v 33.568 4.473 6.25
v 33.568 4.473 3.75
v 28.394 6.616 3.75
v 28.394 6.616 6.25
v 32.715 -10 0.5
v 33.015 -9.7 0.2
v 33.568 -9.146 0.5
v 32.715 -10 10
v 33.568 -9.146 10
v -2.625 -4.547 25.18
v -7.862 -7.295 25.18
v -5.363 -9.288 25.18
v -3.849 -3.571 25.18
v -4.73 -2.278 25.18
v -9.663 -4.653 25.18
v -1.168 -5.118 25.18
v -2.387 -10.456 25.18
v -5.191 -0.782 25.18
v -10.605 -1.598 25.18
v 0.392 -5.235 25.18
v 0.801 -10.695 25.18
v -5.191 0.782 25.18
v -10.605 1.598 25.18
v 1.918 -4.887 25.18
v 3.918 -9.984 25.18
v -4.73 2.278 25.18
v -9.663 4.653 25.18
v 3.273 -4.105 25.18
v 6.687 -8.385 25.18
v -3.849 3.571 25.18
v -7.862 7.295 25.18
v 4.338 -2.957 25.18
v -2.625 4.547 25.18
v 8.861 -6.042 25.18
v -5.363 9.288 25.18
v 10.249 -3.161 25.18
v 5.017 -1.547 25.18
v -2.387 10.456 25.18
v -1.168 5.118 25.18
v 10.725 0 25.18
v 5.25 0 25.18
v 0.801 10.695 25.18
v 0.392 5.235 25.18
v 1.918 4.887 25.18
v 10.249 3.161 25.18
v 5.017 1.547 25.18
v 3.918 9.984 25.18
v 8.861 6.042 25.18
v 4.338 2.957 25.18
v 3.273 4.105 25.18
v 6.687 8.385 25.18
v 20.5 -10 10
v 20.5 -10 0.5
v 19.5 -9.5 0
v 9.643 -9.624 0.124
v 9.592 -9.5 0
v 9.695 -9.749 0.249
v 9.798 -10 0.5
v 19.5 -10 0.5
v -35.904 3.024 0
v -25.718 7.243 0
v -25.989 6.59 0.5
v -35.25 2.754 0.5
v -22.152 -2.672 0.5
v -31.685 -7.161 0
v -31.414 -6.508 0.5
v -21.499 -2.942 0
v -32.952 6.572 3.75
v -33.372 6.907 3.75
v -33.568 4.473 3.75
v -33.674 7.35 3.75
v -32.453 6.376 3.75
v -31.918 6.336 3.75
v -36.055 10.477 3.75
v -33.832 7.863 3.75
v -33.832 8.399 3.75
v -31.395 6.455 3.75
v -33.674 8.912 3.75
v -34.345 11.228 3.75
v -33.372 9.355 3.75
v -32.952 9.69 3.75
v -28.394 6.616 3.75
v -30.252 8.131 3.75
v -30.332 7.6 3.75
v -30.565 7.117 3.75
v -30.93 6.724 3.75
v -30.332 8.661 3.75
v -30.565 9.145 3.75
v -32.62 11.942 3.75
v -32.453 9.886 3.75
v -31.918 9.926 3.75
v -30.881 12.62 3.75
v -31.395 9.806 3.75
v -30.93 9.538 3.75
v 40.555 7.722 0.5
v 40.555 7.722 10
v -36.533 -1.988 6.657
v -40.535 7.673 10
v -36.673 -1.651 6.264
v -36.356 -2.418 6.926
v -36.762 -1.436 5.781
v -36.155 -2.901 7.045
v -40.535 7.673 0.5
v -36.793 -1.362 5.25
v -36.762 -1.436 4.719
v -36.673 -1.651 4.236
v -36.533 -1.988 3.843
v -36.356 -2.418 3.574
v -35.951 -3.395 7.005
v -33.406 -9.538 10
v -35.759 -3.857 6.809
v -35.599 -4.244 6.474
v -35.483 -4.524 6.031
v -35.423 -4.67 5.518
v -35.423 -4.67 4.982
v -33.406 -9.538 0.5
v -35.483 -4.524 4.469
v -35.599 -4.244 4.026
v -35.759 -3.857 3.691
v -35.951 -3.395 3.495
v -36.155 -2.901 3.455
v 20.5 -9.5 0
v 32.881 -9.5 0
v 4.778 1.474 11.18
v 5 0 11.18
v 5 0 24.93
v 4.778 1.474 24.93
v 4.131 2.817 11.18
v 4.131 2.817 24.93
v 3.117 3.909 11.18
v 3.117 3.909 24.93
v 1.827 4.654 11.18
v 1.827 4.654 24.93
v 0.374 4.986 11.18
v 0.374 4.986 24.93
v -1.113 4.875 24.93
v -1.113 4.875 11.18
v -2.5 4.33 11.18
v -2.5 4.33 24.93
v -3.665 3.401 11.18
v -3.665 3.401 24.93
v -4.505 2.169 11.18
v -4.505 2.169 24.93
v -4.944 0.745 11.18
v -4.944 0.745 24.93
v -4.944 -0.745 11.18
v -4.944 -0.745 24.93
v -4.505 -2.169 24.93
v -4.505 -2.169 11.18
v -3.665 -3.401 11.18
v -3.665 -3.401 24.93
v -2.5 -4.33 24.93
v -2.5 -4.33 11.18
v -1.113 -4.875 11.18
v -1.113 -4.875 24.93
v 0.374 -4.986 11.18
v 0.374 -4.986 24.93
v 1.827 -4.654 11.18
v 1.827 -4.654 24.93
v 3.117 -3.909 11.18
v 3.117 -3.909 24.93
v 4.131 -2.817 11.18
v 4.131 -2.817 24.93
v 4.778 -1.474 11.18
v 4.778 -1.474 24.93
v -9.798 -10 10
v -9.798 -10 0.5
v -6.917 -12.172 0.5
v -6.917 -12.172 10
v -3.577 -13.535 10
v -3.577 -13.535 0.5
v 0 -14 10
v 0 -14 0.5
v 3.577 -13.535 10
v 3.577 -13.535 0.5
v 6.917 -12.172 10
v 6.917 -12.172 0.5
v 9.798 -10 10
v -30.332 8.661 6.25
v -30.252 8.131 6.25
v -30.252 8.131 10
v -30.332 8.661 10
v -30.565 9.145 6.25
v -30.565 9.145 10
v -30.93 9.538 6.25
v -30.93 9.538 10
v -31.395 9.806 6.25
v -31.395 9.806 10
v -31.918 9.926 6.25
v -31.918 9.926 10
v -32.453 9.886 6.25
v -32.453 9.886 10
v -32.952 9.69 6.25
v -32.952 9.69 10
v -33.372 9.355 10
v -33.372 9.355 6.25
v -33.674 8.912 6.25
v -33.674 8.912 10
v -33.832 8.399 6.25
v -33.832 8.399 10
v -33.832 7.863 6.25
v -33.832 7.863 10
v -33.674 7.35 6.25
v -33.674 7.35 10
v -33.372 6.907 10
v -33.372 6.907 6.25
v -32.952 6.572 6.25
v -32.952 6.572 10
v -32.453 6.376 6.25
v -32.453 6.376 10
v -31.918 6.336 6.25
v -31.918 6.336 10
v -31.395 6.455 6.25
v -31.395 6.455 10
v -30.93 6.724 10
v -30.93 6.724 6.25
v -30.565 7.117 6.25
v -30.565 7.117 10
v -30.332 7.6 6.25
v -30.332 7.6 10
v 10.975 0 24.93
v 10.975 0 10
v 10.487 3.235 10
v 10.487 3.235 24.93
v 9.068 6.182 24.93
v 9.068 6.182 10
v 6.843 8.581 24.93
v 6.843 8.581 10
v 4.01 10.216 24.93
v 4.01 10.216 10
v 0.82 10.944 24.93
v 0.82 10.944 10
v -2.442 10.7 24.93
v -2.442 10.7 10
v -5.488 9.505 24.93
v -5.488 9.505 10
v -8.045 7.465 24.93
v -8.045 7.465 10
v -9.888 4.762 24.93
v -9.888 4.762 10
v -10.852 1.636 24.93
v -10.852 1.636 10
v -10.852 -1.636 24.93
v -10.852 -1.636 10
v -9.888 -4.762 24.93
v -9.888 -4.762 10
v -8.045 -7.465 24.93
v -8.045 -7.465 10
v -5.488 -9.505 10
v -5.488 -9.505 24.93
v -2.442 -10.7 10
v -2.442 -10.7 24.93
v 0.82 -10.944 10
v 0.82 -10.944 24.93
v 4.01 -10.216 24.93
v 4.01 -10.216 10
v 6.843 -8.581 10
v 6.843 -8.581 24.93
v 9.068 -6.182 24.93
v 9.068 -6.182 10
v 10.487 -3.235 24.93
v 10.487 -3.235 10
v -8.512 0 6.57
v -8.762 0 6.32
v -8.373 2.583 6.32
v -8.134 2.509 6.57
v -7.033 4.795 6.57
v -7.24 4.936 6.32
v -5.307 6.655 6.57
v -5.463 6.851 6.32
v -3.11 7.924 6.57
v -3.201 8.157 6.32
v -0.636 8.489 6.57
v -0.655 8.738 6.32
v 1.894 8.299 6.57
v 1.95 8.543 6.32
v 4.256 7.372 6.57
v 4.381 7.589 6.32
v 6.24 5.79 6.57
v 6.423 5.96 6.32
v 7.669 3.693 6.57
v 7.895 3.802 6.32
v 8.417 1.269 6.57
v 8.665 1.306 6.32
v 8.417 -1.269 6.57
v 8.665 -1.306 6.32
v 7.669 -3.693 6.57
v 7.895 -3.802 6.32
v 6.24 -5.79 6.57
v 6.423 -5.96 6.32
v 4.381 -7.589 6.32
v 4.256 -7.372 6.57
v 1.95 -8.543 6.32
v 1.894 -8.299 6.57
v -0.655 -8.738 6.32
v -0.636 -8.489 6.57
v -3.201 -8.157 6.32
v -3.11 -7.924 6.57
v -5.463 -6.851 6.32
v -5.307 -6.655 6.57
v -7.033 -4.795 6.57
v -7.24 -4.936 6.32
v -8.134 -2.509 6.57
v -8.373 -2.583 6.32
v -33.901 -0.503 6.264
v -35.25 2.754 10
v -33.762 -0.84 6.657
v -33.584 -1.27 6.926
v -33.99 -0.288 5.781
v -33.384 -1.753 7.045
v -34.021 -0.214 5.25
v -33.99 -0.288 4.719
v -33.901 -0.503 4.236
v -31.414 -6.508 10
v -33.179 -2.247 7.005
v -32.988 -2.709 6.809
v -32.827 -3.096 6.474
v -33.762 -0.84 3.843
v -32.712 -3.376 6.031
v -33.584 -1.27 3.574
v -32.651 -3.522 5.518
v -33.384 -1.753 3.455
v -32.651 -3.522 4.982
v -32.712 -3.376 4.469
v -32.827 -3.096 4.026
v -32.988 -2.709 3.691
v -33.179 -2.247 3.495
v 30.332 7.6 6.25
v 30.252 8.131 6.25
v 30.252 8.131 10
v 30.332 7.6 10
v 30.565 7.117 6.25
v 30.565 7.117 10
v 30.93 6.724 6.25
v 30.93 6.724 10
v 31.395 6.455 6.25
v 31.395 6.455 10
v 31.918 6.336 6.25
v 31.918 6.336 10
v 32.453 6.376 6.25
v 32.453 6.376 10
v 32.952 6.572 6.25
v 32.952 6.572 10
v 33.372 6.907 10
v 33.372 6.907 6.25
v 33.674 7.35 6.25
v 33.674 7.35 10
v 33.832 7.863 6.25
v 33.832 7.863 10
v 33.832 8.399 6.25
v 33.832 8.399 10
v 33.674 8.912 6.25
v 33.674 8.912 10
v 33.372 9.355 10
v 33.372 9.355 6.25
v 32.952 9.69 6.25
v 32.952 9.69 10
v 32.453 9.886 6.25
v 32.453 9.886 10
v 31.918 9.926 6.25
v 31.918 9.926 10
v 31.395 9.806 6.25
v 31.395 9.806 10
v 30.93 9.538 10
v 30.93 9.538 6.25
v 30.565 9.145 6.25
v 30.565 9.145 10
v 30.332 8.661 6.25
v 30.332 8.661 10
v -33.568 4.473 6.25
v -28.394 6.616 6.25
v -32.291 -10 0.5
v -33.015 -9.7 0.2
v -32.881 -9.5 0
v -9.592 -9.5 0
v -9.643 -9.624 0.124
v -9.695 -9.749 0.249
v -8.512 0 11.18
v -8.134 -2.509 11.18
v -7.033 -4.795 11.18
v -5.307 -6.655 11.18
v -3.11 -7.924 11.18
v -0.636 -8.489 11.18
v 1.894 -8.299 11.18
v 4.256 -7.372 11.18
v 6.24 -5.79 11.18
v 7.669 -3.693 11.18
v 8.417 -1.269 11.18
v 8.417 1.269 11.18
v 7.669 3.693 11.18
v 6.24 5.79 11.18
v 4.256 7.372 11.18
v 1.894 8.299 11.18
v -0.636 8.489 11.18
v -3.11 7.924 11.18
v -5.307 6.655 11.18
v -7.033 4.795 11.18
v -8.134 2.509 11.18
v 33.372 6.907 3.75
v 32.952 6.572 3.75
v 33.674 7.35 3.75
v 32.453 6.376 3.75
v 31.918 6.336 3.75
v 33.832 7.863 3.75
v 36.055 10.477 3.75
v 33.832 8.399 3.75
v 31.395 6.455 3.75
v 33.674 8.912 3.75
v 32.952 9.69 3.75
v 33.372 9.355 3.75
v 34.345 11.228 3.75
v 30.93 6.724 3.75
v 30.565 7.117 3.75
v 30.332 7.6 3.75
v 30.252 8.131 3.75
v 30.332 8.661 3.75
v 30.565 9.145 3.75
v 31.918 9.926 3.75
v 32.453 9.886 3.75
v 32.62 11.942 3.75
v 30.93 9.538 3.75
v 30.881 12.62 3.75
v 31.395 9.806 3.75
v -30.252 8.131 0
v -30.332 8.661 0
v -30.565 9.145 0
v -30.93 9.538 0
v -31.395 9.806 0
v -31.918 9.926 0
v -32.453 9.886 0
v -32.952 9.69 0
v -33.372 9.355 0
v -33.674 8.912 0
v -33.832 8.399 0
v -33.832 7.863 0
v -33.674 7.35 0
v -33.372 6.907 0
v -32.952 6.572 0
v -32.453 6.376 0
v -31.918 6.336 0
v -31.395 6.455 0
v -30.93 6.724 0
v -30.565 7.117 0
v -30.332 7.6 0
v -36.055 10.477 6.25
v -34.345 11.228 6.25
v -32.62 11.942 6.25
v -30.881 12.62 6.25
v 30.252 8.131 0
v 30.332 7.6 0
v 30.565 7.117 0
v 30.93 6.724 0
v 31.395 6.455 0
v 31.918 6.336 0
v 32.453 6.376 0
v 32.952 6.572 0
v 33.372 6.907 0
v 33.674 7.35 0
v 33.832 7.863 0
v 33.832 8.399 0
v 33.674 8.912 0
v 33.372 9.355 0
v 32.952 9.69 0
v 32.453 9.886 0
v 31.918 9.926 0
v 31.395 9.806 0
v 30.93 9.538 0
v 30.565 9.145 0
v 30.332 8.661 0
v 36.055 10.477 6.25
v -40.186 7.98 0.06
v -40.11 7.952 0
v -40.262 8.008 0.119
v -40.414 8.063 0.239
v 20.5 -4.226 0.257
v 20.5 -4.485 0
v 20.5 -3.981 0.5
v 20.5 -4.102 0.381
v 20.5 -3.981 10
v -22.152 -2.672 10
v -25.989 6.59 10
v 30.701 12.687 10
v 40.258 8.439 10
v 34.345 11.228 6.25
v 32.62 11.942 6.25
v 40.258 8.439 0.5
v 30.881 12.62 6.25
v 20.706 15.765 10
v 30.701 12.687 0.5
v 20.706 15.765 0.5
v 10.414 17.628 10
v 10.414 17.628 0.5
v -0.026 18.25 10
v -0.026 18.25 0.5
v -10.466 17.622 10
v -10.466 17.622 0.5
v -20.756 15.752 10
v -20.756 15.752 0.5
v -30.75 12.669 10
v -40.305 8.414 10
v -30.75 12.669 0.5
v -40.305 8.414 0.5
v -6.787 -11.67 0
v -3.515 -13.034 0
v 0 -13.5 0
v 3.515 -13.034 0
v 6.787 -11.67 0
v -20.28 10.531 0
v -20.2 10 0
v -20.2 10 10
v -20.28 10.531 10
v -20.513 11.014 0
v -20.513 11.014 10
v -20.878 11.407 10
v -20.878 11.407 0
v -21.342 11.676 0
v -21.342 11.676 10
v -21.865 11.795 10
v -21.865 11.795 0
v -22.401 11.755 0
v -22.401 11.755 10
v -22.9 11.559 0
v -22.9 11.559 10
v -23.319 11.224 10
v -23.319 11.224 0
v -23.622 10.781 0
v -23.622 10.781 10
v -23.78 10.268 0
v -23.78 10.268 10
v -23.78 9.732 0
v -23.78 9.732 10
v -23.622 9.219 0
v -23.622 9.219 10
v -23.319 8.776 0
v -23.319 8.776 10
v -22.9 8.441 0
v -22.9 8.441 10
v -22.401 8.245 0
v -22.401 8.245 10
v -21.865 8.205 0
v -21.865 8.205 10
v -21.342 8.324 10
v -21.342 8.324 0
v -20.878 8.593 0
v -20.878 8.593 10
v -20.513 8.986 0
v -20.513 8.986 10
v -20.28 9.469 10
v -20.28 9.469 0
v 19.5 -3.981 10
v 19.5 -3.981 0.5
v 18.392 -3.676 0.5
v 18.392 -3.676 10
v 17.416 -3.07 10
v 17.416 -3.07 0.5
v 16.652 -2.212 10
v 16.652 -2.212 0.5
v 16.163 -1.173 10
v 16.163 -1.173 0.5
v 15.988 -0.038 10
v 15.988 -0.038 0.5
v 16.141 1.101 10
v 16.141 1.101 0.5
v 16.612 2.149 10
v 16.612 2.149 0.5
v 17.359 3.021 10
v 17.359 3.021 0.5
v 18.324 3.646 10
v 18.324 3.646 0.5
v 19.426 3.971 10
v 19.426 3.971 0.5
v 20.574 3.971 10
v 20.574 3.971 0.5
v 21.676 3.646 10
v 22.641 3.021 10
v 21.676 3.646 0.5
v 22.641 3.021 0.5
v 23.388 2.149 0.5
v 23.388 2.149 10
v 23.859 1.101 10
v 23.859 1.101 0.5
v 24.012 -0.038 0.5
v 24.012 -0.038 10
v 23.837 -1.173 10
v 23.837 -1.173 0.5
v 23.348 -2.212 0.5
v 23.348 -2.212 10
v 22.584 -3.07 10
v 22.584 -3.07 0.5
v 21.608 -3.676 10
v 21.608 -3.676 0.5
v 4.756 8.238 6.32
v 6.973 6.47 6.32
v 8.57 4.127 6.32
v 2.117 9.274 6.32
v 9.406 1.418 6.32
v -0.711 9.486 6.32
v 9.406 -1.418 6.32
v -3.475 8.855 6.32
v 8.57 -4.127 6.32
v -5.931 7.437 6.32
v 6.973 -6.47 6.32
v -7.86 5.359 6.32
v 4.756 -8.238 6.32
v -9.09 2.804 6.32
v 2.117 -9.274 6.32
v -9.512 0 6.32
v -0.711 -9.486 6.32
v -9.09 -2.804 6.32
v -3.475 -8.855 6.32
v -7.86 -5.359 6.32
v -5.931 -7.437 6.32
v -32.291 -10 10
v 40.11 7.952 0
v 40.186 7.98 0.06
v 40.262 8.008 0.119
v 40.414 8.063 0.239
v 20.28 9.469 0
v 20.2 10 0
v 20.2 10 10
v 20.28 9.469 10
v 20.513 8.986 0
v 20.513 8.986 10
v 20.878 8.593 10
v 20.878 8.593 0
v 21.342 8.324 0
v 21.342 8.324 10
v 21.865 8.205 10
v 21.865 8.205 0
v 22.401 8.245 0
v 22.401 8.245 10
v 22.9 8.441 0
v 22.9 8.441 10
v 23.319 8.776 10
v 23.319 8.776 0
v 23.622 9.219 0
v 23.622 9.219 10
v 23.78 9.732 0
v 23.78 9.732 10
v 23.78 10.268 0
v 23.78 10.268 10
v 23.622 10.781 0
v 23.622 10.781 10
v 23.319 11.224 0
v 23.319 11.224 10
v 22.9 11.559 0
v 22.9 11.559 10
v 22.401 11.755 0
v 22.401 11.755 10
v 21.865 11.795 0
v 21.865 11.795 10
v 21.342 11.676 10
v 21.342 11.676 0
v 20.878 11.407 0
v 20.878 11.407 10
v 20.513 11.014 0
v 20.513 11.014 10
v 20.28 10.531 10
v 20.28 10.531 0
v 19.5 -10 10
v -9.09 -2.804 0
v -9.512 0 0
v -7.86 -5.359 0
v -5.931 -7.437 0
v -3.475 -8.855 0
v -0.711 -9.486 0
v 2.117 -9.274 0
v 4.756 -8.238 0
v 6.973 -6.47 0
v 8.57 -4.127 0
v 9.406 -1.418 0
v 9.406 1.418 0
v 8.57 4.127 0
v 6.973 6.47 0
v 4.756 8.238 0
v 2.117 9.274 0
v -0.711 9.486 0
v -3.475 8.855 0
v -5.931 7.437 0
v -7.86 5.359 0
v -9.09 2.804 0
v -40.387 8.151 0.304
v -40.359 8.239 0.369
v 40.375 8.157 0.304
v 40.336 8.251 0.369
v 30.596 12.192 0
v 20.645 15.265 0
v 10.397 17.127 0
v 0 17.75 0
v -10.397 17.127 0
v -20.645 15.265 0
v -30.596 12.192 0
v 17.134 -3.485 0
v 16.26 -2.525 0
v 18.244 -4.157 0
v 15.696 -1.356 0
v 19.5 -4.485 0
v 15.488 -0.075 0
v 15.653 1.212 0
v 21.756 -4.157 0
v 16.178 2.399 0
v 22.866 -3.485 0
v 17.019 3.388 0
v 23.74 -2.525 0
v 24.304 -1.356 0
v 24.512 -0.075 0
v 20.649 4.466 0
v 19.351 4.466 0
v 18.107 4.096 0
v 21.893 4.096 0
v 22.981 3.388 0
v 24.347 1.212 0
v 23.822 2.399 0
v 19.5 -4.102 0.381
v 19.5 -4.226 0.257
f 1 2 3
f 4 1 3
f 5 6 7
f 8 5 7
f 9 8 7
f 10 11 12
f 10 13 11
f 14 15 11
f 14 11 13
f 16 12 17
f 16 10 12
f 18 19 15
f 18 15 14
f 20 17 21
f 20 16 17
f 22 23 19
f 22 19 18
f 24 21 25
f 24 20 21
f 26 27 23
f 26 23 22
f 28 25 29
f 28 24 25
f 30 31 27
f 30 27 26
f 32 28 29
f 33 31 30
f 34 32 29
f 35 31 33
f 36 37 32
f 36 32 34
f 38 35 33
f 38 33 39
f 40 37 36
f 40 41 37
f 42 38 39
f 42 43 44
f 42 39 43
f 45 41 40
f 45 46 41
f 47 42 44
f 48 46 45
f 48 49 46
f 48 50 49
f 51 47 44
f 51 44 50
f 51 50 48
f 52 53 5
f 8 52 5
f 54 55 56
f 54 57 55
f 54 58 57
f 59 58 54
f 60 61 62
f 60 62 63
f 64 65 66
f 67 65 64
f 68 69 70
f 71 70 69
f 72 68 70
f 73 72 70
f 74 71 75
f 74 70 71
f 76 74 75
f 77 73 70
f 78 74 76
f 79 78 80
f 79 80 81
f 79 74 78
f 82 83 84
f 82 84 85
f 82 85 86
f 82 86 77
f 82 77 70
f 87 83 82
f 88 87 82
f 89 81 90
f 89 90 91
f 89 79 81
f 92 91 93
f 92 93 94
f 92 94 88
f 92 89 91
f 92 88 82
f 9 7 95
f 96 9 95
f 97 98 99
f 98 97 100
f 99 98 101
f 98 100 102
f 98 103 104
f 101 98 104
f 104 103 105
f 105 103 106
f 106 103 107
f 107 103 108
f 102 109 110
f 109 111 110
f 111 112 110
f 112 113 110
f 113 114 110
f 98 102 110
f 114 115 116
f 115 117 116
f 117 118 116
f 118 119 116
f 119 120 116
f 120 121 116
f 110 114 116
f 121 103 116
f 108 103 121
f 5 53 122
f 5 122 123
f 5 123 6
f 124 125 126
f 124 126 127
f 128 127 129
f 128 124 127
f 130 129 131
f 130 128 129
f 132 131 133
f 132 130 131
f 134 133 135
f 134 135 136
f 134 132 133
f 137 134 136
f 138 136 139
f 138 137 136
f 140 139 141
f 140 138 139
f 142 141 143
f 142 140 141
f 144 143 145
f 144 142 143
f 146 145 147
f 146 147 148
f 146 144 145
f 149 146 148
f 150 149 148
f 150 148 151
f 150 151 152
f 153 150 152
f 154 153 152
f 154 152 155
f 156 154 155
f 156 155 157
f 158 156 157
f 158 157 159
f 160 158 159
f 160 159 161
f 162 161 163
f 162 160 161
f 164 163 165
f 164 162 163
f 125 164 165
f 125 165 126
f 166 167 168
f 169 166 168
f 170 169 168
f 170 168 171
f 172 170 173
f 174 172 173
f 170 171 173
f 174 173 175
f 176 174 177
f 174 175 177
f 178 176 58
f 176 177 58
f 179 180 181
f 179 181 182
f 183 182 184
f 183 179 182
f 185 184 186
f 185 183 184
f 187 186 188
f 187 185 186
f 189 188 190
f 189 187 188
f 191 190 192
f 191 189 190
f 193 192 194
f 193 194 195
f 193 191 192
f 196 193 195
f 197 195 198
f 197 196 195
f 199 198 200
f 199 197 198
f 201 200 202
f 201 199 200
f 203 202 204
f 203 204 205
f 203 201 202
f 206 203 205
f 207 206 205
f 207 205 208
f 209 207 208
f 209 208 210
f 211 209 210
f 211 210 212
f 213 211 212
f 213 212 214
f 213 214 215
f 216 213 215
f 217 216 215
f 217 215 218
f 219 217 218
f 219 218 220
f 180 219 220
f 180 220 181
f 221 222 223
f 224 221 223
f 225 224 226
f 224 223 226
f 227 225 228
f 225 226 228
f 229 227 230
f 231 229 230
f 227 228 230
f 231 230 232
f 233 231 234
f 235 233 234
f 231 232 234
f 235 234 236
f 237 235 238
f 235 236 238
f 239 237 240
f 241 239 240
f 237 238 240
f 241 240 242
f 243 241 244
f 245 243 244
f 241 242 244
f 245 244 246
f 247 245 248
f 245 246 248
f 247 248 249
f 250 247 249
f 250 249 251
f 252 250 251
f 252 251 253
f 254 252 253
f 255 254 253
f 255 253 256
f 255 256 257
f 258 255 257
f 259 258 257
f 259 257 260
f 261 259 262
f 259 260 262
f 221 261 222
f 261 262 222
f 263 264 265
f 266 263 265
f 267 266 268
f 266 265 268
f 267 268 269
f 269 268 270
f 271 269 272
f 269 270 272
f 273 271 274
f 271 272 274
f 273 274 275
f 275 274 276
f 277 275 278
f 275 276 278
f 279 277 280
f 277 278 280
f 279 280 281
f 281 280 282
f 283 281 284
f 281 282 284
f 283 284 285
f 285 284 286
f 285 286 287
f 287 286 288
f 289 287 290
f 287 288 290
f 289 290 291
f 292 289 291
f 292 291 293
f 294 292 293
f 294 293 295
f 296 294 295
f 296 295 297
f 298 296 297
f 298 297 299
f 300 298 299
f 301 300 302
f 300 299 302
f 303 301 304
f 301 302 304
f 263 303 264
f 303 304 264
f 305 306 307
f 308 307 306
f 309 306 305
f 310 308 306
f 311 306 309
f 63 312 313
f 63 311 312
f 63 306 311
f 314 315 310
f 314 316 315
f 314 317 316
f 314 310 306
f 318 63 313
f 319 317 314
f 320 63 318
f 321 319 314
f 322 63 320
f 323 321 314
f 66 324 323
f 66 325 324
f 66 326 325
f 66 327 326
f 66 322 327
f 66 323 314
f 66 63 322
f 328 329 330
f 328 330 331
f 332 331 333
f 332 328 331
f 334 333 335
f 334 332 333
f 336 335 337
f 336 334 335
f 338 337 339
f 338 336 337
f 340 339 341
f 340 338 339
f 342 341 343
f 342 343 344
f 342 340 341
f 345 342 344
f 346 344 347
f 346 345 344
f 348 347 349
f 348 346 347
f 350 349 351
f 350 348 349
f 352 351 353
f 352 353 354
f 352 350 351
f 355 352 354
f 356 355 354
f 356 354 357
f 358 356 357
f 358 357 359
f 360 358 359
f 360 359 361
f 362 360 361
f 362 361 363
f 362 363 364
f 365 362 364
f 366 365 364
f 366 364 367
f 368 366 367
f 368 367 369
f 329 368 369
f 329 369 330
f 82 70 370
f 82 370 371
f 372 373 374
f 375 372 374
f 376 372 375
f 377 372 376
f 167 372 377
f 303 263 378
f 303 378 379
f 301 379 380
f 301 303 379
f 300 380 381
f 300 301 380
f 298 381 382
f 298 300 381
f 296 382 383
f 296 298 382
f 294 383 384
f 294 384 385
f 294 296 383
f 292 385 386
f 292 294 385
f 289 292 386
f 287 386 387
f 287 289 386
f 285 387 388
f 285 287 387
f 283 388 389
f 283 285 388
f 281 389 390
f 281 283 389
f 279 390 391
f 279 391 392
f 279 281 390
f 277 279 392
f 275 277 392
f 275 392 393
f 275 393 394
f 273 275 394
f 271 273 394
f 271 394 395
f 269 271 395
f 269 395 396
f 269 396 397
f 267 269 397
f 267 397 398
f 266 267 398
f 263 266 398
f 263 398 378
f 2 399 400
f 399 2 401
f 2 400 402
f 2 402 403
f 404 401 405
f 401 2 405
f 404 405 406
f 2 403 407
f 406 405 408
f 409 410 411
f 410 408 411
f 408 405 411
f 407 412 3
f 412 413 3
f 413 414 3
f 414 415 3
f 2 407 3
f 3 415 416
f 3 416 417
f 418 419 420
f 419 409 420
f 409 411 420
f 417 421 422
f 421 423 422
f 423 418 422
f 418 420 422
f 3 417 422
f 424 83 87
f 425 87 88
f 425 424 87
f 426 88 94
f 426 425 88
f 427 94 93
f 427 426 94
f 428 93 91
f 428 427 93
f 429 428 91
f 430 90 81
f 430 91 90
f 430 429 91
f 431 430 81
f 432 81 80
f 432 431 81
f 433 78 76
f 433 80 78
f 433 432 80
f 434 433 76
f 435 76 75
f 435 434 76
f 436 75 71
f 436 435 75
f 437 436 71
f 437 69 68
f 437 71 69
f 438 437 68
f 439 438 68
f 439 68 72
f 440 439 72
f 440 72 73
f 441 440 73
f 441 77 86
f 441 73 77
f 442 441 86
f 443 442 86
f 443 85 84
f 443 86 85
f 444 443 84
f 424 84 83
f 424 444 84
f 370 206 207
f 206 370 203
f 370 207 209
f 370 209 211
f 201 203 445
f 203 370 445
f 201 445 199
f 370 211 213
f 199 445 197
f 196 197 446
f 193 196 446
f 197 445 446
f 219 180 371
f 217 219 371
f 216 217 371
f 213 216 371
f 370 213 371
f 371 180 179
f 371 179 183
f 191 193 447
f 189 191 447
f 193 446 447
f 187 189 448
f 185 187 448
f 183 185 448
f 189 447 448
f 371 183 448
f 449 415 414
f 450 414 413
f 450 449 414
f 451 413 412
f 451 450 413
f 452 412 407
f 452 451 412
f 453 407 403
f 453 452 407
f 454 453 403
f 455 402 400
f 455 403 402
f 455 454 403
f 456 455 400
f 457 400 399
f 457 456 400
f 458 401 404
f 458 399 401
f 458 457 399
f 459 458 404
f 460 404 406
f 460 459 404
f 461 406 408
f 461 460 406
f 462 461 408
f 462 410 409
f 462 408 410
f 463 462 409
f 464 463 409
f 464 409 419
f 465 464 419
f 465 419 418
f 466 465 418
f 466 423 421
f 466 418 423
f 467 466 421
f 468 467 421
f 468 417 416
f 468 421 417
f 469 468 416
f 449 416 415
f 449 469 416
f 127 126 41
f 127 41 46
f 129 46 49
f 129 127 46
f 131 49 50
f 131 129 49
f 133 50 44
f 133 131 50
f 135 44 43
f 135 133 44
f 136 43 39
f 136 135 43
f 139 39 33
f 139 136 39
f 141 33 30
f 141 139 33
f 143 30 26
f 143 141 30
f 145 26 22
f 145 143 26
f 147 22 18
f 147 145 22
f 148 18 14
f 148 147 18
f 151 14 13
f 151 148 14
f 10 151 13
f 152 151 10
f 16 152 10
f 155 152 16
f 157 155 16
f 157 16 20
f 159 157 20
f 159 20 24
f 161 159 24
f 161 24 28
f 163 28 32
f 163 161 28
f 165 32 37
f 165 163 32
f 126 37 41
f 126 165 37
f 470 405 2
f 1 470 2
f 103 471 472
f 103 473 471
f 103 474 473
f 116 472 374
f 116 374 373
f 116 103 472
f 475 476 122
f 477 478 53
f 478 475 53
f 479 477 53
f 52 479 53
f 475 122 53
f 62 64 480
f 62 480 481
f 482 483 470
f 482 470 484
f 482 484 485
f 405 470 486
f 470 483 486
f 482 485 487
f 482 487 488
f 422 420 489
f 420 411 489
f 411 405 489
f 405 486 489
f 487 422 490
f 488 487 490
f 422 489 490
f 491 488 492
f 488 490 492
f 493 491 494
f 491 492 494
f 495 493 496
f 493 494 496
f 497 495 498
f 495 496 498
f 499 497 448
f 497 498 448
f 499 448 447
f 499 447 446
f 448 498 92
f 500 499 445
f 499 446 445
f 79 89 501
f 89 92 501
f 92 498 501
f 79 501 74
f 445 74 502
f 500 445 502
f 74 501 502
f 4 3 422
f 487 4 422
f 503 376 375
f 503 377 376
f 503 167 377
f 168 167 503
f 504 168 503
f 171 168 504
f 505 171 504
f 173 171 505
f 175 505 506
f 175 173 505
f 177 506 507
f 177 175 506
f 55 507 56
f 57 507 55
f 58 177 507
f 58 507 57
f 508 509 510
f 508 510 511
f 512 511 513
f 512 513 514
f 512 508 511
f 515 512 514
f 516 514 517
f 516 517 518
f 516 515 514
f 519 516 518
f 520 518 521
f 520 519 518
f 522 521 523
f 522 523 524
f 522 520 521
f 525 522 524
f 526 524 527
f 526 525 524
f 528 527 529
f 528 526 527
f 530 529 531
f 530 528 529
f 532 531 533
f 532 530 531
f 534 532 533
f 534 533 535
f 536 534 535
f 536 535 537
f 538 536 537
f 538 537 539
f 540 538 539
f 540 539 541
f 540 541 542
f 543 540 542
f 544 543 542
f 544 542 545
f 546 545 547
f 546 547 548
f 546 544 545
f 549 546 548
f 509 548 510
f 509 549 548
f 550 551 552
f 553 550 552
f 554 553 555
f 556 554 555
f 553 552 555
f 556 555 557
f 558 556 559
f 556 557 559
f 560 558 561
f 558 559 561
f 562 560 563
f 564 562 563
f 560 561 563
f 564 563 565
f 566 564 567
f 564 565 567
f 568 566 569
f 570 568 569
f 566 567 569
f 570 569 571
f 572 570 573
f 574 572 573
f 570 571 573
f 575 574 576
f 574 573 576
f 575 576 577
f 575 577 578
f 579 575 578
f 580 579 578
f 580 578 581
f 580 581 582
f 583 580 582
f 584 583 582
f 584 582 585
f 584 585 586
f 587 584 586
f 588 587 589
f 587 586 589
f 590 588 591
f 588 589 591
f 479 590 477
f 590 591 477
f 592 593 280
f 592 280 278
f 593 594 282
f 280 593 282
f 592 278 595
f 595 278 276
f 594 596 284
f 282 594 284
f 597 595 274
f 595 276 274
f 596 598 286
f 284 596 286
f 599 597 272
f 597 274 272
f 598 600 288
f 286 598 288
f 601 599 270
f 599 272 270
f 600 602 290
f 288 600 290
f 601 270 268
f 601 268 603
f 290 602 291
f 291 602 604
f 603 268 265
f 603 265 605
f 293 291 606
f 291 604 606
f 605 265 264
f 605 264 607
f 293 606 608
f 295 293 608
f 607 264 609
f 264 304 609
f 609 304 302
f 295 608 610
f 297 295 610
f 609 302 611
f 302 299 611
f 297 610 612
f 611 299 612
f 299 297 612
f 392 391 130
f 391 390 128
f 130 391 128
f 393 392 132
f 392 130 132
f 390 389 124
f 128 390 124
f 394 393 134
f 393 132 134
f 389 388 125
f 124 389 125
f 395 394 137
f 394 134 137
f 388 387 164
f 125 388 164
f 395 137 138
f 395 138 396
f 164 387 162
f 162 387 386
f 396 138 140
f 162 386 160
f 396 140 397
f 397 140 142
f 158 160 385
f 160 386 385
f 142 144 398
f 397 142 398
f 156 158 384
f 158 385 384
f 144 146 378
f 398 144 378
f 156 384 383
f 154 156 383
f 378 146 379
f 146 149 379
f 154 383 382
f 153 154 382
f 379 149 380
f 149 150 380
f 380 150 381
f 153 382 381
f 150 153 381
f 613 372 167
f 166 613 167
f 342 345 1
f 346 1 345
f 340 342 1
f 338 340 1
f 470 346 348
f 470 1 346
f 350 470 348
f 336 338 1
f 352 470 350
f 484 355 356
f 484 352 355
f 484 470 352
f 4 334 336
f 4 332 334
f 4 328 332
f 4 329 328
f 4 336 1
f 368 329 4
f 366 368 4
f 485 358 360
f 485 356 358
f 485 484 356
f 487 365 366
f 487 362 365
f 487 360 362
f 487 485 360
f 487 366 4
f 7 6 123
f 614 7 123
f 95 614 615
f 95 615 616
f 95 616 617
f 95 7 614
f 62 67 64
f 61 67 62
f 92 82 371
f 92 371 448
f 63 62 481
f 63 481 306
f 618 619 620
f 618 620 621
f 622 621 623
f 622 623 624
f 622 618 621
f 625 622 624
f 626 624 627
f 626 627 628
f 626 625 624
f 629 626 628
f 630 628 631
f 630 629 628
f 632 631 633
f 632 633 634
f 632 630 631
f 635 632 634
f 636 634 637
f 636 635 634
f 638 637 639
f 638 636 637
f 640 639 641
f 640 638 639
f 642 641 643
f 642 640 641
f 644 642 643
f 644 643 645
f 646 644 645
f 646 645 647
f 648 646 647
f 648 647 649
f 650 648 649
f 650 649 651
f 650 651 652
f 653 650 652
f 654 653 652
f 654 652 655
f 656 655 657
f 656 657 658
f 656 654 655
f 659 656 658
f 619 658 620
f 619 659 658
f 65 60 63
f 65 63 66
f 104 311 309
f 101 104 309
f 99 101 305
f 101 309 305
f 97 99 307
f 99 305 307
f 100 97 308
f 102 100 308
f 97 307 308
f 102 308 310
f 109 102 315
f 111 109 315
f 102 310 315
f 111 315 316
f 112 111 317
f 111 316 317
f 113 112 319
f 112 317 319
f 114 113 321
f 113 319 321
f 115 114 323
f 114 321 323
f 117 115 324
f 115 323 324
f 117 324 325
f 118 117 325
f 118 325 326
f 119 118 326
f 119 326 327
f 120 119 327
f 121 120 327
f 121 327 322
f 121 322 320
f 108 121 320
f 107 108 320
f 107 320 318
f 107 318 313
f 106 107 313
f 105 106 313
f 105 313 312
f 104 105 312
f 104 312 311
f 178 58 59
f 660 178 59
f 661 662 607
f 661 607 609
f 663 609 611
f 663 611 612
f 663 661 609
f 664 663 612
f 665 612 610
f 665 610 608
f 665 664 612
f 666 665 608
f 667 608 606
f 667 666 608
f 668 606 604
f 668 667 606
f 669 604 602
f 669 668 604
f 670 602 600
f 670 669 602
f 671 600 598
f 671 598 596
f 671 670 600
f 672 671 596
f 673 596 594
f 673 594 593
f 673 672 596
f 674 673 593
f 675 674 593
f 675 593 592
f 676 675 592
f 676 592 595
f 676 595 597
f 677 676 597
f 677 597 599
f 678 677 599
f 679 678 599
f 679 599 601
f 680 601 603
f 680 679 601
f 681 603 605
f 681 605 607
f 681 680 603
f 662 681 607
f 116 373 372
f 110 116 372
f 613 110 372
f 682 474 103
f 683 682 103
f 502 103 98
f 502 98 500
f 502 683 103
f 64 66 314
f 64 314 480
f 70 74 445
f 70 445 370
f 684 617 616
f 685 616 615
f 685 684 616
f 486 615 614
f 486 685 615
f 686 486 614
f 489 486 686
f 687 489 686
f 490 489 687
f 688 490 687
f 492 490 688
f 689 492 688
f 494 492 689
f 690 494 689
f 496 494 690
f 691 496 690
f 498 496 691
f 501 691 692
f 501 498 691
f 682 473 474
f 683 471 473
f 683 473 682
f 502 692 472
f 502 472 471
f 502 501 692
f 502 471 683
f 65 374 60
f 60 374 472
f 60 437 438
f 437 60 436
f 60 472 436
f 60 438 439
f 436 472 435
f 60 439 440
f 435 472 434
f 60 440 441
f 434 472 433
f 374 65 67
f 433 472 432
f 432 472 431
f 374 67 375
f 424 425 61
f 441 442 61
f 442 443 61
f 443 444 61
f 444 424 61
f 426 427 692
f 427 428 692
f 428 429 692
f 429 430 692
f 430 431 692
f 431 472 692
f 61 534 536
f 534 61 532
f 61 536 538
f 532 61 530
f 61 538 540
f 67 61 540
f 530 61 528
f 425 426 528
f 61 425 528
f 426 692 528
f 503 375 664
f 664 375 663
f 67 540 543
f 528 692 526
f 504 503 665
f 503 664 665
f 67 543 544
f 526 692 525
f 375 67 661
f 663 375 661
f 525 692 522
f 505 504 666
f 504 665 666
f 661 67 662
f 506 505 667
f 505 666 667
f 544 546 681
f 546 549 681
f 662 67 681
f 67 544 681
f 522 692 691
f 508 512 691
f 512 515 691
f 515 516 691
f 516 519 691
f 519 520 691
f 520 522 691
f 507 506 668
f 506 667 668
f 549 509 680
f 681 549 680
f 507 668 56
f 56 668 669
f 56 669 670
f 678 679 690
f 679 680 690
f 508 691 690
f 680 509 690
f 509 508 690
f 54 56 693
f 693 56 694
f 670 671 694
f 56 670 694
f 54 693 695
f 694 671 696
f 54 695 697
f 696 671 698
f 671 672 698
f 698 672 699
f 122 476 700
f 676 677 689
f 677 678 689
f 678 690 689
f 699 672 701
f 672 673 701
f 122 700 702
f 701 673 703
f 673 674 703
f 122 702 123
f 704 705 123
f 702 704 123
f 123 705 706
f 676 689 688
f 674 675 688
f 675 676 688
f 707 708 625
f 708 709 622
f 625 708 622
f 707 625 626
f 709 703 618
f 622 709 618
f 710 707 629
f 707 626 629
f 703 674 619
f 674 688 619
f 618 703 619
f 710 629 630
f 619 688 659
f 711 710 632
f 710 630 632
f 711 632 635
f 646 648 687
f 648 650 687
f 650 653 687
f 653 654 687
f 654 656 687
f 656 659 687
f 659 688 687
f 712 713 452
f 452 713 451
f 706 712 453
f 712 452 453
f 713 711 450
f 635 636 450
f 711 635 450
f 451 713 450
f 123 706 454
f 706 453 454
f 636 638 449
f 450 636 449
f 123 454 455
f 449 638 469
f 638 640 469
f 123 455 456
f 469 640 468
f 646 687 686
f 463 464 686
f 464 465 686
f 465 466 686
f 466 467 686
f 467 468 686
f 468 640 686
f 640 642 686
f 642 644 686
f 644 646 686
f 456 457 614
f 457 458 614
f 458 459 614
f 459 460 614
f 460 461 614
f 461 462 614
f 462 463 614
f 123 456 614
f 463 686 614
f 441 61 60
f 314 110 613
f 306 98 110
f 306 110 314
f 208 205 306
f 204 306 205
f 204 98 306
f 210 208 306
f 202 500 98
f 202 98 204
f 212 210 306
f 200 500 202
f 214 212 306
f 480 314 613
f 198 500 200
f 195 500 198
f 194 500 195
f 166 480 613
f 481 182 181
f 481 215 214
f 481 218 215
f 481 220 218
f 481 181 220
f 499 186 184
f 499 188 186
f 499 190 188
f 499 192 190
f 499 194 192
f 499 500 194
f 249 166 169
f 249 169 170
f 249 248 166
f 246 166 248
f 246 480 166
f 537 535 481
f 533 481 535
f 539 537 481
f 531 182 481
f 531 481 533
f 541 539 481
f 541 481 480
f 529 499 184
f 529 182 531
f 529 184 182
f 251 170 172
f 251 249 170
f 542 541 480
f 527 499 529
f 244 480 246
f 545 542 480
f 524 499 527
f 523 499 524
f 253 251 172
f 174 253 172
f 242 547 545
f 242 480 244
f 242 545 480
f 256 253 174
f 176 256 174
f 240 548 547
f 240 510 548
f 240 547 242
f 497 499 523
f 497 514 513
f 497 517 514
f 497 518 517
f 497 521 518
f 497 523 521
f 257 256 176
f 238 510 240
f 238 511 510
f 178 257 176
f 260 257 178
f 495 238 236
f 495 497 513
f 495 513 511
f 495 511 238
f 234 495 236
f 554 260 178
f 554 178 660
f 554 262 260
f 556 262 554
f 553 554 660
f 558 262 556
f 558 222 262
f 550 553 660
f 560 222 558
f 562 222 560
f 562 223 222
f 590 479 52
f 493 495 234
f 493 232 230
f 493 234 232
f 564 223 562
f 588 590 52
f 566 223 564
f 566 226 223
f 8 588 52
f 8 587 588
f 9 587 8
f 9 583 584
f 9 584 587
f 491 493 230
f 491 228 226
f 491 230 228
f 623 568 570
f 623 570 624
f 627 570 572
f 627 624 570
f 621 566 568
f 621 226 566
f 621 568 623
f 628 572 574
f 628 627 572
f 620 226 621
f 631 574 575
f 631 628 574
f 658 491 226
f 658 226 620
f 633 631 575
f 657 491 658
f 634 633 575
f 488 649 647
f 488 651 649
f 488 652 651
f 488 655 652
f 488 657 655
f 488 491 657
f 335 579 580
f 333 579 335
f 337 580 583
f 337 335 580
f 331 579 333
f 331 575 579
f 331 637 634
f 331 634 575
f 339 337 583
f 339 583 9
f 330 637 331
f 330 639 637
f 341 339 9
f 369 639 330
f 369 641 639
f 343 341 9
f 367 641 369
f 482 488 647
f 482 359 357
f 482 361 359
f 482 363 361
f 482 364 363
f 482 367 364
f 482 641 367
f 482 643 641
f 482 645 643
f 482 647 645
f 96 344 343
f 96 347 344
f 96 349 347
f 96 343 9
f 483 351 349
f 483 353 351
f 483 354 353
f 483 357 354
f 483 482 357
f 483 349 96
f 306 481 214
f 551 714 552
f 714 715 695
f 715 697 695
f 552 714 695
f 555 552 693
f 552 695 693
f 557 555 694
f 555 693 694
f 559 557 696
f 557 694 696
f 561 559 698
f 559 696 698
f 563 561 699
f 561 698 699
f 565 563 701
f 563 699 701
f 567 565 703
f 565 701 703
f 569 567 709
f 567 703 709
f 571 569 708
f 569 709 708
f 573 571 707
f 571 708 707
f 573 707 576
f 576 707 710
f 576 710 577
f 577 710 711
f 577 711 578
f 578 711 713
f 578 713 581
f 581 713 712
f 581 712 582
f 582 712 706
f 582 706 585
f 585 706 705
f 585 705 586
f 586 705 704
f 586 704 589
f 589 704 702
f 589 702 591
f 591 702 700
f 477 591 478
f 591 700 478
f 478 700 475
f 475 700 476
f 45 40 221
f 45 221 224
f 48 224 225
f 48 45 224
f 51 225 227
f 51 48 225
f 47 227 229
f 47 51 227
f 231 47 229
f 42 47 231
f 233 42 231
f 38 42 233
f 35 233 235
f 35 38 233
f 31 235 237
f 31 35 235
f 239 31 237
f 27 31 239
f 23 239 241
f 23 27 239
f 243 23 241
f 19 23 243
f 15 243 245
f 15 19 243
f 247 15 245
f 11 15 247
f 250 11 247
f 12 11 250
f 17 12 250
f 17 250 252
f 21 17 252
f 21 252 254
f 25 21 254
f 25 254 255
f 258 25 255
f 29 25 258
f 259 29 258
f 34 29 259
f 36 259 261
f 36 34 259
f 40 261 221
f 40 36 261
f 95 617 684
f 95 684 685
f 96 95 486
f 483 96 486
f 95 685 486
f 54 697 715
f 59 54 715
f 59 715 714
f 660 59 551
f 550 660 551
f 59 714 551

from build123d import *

# Parameters (mm, degrees)
SKETCH1_R           = 5
SKETCH1_R_2         = 1.8
BOSS_EXTRUDE1_DEPTH = 10
CHAMFER1_SIZE       = 0.5
CUT_EXTRUDE2_DEPTH  = 2.5
CHAMFER2_SIZE       = 0.5
SKETCH4_R           = 1.8
CUT_EXTRUDE3_DEPTH  = 10
CHAMFER3_SIZE       = 0.5
CHAMFER3_SIZE_2     = 0.923879533
CHAMFER3_SIZE_3     = 0.552958444
SKETCH7_R           = 10.975
SKETCH7_R_2         = 5
BOSS_EXTRUDE2_DEPTH = 15.18
SKETCH8_R           = 8.5125
CUT_EXTRUDE6_DEPTH  = 11.18
SKETCH9_R           = 9.5125
CUT_EXTRUDE8_DEPTH  = 6.32
CHAMFER4_SIZE       = 0.25


with BuildPart() as part:
    # Sketch1 → Boss-Extrude1 (new body)
    with BuildSketch(Plane.XY):
        with BuildLine():
            Line((-40.746699048, 8.183561953), (-33.214821075, -10))
            Line((-33.214821075, -10), (-9.797958971, -10))
            ThreePointArc((-9.797958971, -10), (0, -14), (9.797958971, -10))
            Line((9.797958971, -10), (19.5, -10))
            Line((19.5, -10), (19.5, -3.981225471))
            ThreePointArc((19.5, -3.981225471), (20, 4.0125), (20.5, -3.981225471))
            Line((20.5, -3.981225471), (20.5, -10))
            Line((20.5, -10), (33.214821075, -10))
            Line((33.214821075, -10), (40.746699048, 8.183561953))
            ThreePointArc((40.746699048, 8.183561953), (0, 18.25), (-40.746699048, 8.183561953))
        make_face()
        Circle(SKETCH1_R, mode=Mode.SUBTRACT)
        with Locations((-32.052211881, 8.130884627)):
            Circle(SKETCH1_R_2, mode=Mode.SUBTRACT)
        with Locations(Location((32.052211881, 8.130884627, 0), (0, 0, 180))):
            Circle(SKETCH1_R_2, mode=Mode.SUBTRACT)
        with Locations((-22, 10)):
            Circle(SKETCH1_R_2, mode=Mode.SUBTRACT)
        with Locations(Location((22, 10, 0), (0, 0, 180))):
            Circle(SKETCH1_R_2, mode=Mode.SUBTRACT)
        Polygon((-25.988511975, 6.5901118), (-35.250404289, 2.75371039), (-31.414002879, -6.508181923), (-22.152110566, -2.671780514), align=None, mode=Mode.SUBTRACT)
    extrude(amount=BOSS_EXTRUDE1_DEPTH)

    # Chamfer1
    chamfer1_edges = [part.edges().sort_by_distance(p)[0] for p in [
        (20, 4.0125, 0),
        (-24.070311271, 1.959165643, 0),
        (-30.619458132, 4.671911095, 0),
        (-33.332203584, -1.877235766, 0),
        (-26.783056723, -4.589981218, 0),
    ]]
    chamfer(chamfer1_edges, length=CHAMFER1_SIZE)

    # Sketch3 → Cut-Extrude2 (cut)
    with BuildSketch(Plane.XY.offset(3.75)):
        Polygon((-37.076762037, 12.944469155), (-33.567560961, 4.472508325), (-28.393835579, 6.615535546), (-31.903036655, 15.087496376), align=None)
        Polygon((37.076762037, 12.944469155), (33.567560961, 4.472508325), (28.393835579, 6.615535546), (31.903036655, 15.087496376), align=None)
    extrude(amount=CUT_EXTRUDE2_DEPTH, mode=Mode.SUBTRACT)

    # Chamfer2
    chamfer2_edges = [part.edges().sort_by_distance(p)[0] for p in [
        (14.648979486, -10, 0),
        (0, -14, 0),
        (-21.506390023, -10, 0),
        (-36.980760062, -0.908219024, 0),
        (0, 18.25, 0),
        (36.980760062, -0.908219024, 0),
        (26.857410538, -10, 0),
    ]]
    chamfer(chamfer2_edges, length=CHAMFER2_SIZE)

    # Sketch4 → Cut-Extrude3 (cut)
    with BuildSketch(Plane(origin=(-29.114518455, -12.059628406, 0), x_dir=(0, 0, -1), z_dir=(0.9238795325112882, 0.38268343236508634, 0))):
        with Locations(Location((-5.25, 11.021342374, 0), (0, 0, 90))):
            Circle(SKETCH4_R)
    extrude(amount=-CUT_EXTRUDE3_DEPTH, mode=Mode.SUBTRACT)

    # Chamfer3
    # the kernel refuses this chamfer: 0.923879533, 0.552958444, 0.5 mm, written as the material it takes off along each edge
    with BuildSketch(Plane(origin=(40.746699048, 8.183561953, -0.920037939), x_dir=(-0.38268343236508906, -0.923879532511287, 0), z_dir=(0, 0, 1))) as chamfer3_piece_1:
        with BuildLine():
            Line((CHAMFER3_SIZE, 0), (-0.048717445, -0.548717445))
            ThreePointArc((-0.048717445, -0.548717445), (-0.025540103, -0.282767493), (0, 0))
            Line((0, 0), (CHAMFER3_SIZE, 0))
        make_face()
    extrude(amount=12.340075878, mode=Mode.SUBTRACT)
    with BuildSketch(Plane(origin=(33.214821075, -10, -1.895315111), x_dir=(-1, 0, 0), z_dir=(0, 0, 1)), Plane(origin=(-33.214821075, -10, -1.895315111), x_dir=(-0.38268343236508656, 0.9238795325112881, 0), z_dir=(0, 0, 1))) as chamfer3_piece_2:
        Polygon((CHAMFER3_SIZE, 0), (-CHAMFER3_SIZE_2 * 0.382683432163, -CHAMFER3_SIZE_2 * 0.923879532023), (0, 0), align=None)
    extrude(amount=14.290630221, mode=Mode.SUBTRACT)
    with BuildSketch(Plane(origin=(-40.746699048, 8.183561953, -0.925350902), x_dir=(0.38268343236508684, -0.9238795325112881, 0), z_dir=(0, 0, 1))) as chamfer3_piece_3:
        with BuildLine():
            Line((CHAMFER3_SIZE_3, 0), (-0.04424113, 0.496614821))
            ThreePointArc((-0.04424113, 0.496614821), (-0.0231658, 0.256042208), (0, 0))
            Line((0, 0), (CHAMFER3_SIZE_3, 0))
        make_face()
    extrude(amount=12.350701805, mode=Mode.SUBTRACT)

    # Sketch7 → Boss-Extrude2 (add)
    with BuildSketch(Plane.XY.offset(10)):
        Circle(SKETCH7_R)
        Circle(SKETCH7_R_2, mode=Mode.SUBTRACT)
    extrude(amount=BOSS_EXTRUDE2_DEPTH)

    # Sketch8 → Cut-Extrude6 (cut)
    with BuildSketch(Plane.XY):
        with Locations(Location((0, 0, 0), (0, 0, 180))):
            Circle(SKETCH8_R)
    extrude(amount=CUT_EXTRUDE6_DEPTH, mode=Mode.SUBTRACT)

    # Sketch9 → Cut-Extrude8 (cut)
    with BuildSketch(Plane.XY):
        with Locations(Location((0, 0, 0), (0, 0, 180))):
            Circle(SKETCH9_R)
    extrude(amount=CUT_EXTRUDE8_DEPTH, mode=Mode.SUBTRACT)

    # Chamfer4
    chamfer4_edges = [part.edges().sort_by_distance(p)[0] for p in [
        (-10.975, 0, 25.18),
        (-5, 0, 25.18),
        (8.5125, 0, 6.32),
    ]]
    chamfer(chamfer4_edges, length=CHAMFER4_SIZE)


solid = part.part
